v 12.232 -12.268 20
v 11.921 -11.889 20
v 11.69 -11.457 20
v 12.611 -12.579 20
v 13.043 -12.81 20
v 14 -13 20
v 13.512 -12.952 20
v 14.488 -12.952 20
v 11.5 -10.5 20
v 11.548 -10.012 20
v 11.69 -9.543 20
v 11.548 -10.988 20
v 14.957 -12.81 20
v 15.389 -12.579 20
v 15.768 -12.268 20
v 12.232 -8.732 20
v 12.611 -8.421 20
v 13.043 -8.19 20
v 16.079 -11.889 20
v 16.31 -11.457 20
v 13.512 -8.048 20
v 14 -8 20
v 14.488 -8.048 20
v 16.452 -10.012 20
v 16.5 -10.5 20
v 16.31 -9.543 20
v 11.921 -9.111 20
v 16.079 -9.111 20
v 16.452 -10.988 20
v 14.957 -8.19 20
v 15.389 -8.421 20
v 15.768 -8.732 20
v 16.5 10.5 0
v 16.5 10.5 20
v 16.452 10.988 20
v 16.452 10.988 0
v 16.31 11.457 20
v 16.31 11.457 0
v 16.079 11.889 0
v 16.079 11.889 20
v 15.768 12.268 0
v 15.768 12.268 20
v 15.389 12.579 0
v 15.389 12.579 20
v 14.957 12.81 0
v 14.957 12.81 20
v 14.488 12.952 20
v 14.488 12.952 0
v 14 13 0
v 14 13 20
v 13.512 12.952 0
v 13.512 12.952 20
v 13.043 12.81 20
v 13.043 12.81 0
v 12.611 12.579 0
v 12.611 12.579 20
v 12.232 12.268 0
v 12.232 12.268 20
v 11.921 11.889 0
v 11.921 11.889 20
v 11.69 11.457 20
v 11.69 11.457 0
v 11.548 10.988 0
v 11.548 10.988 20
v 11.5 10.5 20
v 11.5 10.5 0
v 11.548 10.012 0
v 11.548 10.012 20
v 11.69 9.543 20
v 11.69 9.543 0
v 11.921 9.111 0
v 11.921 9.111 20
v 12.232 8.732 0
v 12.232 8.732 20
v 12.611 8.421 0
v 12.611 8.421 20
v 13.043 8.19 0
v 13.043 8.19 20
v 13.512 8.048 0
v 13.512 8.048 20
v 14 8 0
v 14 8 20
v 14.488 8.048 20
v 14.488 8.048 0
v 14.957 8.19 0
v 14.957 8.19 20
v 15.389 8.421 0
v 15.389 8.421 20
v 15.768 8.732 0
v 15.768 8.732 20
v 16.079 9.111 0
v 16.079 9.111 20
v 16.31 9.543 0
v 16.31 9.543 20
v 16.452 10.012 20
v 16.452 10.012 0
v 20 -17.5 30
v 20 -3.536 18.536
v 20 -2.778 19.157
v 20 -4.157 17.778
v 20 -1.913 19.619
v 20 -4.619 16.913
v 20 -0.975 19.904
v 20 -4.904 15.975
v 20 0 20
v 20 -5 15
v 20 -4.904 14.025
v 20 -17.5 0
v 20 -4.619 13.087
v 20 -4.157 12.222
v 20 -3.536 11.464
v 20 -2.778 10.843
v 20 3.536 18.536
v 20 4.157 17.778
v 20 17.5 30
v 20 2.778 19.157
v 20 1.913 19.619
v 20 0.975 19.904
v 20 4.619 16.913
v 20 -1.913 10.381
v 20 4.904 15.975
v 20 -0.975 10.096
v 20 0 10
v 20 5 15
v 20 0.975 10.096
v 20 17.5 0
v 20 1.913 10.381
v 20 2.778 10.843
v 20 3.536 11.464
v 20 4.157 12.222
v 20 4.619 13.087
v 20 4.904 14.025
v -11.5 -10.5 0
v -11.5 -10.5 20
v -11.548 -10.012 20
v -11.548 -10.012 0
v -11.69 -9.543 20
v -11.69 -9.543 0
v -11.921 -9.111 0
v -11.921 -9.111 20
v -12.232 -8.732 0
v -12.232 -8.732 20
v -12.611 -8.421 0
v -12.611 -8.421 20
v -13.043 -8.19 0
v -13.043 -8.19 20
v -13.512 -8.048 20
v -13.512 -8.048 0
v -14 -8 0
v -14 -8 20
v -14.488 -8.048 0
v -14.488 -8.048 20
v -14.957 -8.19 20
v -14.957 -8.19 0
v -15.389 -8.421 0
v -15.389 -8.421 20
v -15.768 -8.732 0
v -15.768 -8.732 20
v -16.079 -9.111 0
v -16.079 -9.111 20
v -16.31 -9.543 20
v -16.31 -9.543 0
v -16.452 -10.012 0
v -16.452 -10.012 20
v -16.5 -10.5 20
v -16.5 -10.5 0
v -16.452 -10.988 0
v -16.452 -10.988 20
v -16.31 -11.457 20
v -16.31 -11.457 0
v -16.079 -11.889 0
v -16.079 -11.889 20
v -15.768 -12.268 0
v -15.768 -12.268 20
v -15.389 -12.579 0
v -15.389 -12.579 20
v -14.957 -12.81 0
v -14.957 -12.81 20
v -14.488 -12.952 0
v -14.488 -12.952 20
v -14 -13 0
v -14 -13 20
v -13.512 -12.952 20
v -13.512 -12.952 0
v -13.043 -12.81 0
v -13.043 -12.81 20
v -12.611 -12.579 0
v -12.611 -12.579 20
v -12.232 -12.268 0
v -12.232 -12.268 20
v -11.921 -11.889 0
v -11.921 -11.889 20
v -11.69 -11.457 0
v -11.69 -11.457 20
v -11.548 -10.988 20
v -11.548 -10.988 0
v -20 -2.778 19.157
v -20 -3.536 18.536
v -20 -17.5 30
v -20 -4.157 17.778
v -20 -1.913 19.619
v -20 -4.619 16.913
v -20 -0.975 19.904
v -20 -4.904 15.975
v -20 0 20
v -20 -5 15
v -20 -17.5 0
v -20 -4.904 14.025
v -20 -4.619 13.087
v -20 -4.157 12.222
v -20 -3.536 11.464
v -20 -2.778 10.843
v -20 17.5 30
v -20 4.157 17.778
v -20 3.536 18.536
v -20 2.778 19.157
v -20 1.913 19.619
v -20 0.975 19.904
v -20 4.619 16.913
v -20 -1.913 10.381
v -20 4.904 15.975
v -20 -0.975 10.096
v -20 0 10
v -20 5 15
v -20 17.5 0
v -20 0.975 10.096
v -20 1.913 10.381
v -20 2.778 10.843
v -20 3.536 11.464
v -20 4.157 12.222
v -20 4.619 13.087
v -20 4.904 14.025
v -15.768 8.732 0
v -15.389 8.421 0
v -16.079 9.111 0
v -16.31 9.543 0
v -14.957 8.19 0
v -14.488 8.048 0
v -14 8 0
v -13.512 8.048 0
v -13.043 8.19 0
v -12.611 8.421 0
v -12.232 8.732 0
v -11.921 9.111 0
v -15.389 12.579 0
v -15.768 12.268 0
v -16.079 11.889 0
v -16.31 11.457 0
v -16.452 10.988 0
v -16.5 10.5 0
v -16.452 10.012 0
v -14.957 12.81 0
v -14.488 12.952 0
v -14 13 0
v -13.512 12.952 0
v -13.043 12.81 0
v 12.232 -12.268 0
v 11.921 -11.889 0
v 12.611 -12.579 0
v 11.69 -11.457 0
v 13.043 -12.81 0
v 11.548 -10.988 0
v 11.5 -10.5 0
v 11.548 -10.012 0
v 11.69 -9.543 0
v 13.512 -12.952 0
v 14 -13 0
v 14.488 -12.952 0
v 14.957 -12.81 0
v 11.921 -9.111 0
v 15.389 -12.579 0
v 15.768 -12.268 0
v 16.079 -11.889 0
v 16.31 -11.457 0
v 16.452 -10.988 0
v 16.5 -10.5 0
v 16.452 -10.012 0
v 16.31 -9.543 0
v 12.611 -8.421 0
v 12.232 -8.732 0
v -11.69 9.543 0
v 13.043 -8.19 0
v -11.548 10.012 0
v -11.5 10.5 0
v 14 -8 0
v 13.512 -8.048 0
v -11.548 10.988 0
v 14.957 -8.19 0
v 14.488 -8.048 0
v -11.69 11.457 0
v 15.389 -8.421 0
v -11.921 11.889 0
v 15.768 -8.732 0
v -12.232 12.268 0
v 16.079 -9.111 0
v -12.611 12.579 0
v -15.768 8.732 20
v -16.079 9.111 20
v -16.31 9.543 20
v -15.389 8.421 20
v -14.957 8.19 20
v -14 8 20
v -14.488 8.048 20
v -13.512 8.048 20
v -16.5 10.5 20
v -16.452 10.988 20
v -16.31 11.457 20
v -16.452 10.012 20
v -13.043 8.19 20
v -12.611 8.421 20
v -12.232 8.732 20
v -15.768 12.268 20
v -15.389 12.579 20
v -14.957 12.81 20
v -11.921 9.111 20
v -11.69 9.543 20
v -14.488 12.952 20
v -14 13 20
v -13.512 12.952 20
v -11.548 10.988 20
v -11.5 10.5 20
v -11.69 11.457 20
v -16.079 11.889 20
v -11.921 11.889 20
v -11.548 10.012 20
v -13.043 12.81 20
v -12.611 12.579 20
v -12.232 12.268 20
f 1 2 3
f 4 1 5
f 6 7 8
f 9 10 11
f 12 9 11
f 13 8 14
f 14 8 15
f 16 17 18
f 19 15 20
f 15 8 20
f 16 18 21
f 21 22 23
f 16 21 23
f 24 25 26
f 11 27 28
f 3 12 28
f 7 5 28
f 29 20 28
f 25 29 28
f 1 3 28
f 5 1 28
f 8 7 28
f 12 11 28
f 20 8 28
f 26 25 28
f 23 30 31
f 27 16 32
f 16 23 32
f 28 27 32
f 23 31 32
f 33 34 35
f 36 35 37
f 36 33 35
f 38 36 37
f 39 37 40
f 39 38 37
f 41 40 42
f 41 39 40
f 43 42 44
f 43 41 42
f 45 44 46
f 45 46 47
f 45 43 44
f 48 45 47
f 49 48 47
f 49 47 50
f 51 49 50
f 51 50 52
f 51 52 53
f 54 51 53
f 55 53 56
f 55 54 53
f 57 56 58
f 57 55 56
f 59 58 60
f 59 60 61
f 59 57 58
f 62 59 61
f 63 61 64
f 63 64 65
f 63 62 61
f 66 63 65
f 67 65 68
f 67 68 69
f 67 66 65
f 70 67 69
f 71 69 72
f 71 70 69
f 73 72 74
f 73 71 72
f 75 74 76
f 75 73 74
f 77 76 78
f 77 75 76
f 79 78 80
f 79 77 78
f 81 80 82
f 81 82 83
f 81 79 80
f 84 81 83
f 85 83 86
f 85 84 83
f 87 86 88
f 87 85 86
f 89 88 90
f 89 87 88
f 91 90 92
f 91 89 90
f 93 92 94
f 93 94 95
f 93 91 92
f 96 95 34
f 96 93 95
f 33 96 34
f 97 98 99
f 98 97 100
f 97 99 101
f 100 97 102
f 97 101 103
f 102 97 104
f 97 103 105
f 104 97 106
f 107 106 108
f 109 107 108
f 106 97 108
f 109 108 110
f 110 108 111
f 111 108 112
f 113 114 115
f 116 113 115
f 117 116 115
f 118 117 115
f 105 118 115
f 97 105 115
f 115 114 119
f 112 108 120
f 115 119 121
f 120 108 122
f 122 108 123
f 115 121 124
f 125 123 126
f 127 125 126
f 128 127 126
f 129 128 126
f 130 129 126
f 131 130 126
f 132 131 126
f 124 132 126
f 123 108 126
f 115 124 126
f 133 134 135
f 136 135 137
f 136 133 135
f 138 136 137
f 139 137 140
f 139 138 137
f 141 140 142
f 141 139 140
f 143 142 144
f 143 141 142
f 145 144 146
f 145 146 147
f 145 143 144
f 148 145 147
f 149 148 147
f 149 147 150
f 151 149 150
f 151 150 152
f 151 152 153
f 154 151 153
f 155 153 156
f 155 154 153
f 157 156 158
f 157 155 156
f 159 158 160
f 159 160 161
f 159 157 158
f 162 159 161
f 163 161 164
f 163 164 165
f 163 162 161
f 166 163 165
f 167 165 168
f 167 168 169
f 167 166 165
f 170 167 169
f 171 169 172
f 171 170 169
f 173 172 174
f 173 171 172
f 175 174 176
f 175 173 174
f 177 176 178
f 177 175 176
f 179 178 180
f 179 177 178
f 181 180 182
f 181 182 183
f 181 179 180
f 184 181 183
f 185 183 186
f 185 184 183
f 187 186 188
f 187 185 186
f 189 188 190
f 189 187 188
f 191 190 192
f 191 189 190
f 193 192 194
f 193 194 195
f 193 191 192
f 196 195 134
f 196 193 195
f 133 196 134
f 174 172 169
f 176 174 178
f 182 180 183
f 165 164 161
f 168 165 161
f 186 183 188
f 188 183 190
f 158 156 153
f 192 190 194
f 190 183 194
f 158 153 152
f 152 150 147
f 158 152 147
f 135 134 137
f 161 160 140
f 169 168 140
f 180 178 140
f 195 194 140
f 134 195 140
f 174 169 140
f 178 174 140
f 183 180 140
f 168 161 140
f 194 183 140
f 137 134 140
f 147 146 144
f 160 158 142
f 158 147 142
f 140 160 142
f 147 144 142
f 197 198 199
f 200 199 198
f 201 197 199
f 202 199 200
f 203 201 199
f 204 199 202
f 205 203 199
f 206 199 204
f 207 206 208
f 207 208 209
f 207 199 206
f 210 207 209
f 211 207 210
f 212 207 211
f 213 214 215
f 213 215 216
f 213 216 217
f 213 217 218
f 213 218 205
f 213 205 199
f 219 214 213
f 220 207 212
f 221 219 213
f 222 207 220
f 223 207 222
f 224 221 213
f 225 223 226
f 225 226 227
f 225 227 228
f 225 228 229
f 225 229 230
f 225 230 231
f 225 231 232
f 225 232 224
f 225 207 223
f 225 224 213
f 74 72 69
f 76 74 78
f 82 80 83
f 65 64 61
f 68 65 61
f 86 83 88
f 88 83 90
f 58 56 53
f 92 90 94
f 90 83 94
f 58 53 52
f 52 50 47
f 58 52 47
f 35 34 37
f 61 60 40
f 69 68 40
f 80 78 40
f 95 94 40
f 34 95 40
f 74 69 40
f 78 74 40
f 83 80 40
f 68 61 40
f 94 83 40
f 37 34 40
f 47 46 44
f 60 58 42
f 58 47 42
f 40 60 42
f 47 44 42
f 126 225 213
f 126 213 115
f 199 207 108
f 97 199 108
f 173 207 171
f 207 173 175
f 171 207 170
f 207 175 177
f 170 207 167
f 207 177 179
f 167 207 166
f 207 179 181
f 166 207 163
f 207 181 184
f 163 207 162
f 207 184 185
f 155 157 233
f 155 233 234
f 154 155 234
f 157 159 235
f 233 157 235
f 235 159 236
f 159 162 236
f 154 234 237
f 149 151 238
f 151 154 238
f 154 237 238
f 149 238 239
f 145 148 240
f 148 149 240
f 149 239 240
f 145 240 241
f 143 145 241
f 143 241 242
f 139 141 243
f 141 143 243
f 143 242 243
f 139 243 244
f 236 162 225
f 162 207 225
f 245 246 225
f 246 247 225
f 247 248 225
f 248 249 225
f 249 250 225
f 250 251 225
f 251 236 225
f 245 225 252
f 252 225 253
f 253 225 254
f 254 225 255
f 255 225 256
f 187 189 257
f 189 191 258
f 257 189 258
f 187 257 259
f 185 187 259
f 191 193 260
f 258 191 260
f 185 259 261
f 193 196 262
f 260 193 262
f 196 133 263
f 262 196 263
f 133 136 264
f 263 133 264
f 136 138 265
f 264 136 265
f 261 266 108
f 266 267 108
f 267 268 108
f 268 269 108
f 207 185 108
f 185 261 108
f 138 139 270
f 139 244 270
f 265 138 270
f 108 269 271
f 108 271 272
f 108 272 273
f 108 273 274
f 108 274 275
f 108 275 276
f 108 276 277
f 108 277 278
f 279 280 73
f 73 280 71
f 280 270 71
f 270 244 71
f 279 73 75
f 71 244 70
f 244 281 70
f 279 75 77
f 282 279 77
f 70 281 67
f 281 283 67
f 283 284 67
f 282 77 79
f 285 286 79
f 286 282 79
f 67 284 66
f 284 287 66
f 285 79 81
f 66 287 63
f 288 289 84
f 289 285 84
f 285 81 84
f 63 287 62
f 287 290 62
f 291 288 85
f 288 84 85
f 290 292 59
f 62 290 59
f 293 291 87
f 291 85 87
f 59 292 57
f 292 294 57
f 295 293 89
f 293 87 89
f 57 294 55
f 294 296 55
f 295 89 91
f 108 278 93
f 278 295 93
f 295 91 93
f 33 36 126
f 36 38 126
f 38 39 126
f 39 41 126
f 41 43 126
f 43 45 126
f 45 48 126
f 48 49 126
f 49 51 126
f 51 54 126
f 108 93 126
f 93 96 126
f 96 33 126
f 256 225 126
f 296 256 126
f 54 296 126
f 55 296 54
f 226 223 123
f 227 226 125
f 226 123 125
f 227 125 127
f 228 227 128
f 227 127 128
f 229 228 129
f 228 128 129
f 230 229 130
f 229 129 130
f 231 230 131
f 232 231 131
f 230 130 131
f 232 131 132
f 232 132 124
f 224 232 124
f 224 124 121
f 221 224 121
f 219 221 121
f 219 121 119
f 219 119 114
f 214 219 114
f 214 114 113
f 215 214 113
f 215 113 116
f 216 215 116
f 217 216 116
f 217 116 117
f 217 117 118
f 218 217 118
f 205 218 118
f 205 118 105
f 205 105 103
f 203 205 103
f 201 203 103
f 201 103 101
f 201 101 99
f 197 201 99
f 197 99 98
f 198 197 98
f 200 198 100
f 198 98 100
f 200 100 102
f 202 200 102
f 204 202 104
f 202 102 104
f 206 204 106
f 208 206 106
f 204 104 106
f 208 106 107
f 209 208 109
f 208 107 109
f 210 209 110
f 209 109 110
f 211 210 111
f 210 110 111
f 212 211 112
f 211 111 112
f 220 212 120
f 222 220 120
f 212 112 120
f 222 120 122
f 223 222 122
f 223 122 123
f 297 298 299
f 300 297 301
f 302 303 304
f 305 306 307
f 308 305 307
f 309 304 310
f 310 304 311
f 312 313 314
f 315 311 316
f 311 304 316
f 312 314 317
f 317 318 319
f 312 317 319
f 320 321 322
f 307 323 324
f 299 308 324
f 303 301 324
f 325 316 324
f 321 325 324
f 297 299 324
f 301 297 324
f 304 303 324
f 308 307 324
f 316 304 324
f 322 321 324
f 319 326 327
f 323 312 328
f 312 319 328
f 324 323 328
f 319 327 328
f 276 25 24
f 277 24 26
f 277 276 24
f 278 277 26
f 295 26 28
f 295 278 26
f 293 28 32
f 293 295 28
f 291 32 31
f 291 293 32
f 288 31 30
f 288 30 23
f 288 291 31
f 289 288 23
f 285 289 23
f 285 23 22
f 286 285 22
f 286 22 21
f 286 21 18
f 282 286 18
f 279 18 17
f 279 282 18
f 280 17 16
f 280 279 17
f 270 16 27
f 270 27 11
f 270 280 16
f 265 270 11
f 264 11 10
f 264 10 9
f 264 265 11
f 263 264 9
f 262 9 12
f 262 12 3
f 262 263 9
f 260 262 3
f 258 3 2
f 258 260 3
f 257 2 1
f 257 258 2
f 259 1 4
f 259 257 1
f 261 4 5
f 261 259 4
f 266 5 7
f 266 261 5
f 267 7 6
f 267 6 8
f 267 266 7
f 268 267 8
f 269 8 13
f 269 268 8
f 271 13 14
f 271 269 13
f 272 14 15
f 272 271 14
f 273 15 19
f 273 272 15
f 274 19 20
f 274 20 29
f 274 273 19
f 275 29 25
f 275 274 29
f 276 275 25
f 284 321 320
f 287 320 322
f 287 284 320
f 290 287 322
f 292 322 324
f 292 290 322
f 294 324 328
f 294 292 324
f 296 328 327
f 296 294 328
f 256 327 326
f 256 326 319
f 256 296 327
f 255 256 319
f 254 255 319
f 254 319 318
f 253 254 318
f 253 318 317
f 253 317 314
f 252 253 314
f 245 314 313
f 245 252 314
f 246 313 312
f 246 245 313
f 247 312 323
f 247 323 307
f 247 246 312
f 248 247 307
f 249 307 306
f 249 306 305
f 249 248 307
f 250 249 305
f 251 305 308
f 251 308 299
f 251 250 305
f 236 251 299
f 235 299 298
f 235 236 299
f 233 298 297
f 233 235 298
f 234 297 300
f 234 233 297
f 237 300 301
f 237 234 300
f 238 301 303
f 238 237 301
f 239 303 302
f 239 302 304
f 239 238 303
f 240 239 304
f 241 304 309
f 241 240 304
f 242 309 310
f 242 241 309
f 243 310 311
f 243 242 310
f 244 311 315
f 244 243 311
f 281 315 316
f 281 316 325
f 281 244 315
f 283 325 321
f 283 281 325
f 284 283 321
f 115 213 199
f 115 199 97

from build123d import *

# Parameters (mm, degrees)
SKETCH_1_W          = 40
SKETCH_1_H          = 35
EXTRUDE_1_DEPTH     = 30
SKETCH_2_R          = 2.5
CUT_EXTRUDE_2_DEPTH = 20
SKETCH_3_R          = 5
CUT_EXTRUDE_3_DEPTH = 53.974050251


with BuildPart() as part:
    # 草图1 → 凸台-拉伸1 (new body)
    with BuildSketch(Plane.XY):
        Rectangle(SKETCH_1_W, SKETCH_1_H)
    extrude(amount=EXTRUDE_1_DEPTH)

    # 草图2 → 切除-拉伸2 (cut)
    with BuildSketch(Plane.XY):
        with Locations((-14, 10.5)):
            Circle(SKETCH_2_R)
        with Locations((14, 10.5)):
            Circle(SKETCH_2_R)
        with Locations((14, -10.5)):
            Circle(SKETCH_2_R)
        with Locations((-14, -10.5)):
            Circle(SKETCH_2_R)
    extrude(amount=CUT_EXTRUDE_2_DEPTH, mode=Mode.SUBTRACT)

    # 草图3 → 切除-拉伸3 (cut, through all)
    with BuildSketch(Plane(origin=(20, 0, 0), x_dir=(0, 0, -1), z_dir=(1, 0, 0))):
        with Locations((-15, 0)):
            Circle(SKETCH_3_R)
    extrude(amount=-CUT_EXTRUDE_3_DEPTH, mode=Mode.SUBTRACT)


solid = part.part
